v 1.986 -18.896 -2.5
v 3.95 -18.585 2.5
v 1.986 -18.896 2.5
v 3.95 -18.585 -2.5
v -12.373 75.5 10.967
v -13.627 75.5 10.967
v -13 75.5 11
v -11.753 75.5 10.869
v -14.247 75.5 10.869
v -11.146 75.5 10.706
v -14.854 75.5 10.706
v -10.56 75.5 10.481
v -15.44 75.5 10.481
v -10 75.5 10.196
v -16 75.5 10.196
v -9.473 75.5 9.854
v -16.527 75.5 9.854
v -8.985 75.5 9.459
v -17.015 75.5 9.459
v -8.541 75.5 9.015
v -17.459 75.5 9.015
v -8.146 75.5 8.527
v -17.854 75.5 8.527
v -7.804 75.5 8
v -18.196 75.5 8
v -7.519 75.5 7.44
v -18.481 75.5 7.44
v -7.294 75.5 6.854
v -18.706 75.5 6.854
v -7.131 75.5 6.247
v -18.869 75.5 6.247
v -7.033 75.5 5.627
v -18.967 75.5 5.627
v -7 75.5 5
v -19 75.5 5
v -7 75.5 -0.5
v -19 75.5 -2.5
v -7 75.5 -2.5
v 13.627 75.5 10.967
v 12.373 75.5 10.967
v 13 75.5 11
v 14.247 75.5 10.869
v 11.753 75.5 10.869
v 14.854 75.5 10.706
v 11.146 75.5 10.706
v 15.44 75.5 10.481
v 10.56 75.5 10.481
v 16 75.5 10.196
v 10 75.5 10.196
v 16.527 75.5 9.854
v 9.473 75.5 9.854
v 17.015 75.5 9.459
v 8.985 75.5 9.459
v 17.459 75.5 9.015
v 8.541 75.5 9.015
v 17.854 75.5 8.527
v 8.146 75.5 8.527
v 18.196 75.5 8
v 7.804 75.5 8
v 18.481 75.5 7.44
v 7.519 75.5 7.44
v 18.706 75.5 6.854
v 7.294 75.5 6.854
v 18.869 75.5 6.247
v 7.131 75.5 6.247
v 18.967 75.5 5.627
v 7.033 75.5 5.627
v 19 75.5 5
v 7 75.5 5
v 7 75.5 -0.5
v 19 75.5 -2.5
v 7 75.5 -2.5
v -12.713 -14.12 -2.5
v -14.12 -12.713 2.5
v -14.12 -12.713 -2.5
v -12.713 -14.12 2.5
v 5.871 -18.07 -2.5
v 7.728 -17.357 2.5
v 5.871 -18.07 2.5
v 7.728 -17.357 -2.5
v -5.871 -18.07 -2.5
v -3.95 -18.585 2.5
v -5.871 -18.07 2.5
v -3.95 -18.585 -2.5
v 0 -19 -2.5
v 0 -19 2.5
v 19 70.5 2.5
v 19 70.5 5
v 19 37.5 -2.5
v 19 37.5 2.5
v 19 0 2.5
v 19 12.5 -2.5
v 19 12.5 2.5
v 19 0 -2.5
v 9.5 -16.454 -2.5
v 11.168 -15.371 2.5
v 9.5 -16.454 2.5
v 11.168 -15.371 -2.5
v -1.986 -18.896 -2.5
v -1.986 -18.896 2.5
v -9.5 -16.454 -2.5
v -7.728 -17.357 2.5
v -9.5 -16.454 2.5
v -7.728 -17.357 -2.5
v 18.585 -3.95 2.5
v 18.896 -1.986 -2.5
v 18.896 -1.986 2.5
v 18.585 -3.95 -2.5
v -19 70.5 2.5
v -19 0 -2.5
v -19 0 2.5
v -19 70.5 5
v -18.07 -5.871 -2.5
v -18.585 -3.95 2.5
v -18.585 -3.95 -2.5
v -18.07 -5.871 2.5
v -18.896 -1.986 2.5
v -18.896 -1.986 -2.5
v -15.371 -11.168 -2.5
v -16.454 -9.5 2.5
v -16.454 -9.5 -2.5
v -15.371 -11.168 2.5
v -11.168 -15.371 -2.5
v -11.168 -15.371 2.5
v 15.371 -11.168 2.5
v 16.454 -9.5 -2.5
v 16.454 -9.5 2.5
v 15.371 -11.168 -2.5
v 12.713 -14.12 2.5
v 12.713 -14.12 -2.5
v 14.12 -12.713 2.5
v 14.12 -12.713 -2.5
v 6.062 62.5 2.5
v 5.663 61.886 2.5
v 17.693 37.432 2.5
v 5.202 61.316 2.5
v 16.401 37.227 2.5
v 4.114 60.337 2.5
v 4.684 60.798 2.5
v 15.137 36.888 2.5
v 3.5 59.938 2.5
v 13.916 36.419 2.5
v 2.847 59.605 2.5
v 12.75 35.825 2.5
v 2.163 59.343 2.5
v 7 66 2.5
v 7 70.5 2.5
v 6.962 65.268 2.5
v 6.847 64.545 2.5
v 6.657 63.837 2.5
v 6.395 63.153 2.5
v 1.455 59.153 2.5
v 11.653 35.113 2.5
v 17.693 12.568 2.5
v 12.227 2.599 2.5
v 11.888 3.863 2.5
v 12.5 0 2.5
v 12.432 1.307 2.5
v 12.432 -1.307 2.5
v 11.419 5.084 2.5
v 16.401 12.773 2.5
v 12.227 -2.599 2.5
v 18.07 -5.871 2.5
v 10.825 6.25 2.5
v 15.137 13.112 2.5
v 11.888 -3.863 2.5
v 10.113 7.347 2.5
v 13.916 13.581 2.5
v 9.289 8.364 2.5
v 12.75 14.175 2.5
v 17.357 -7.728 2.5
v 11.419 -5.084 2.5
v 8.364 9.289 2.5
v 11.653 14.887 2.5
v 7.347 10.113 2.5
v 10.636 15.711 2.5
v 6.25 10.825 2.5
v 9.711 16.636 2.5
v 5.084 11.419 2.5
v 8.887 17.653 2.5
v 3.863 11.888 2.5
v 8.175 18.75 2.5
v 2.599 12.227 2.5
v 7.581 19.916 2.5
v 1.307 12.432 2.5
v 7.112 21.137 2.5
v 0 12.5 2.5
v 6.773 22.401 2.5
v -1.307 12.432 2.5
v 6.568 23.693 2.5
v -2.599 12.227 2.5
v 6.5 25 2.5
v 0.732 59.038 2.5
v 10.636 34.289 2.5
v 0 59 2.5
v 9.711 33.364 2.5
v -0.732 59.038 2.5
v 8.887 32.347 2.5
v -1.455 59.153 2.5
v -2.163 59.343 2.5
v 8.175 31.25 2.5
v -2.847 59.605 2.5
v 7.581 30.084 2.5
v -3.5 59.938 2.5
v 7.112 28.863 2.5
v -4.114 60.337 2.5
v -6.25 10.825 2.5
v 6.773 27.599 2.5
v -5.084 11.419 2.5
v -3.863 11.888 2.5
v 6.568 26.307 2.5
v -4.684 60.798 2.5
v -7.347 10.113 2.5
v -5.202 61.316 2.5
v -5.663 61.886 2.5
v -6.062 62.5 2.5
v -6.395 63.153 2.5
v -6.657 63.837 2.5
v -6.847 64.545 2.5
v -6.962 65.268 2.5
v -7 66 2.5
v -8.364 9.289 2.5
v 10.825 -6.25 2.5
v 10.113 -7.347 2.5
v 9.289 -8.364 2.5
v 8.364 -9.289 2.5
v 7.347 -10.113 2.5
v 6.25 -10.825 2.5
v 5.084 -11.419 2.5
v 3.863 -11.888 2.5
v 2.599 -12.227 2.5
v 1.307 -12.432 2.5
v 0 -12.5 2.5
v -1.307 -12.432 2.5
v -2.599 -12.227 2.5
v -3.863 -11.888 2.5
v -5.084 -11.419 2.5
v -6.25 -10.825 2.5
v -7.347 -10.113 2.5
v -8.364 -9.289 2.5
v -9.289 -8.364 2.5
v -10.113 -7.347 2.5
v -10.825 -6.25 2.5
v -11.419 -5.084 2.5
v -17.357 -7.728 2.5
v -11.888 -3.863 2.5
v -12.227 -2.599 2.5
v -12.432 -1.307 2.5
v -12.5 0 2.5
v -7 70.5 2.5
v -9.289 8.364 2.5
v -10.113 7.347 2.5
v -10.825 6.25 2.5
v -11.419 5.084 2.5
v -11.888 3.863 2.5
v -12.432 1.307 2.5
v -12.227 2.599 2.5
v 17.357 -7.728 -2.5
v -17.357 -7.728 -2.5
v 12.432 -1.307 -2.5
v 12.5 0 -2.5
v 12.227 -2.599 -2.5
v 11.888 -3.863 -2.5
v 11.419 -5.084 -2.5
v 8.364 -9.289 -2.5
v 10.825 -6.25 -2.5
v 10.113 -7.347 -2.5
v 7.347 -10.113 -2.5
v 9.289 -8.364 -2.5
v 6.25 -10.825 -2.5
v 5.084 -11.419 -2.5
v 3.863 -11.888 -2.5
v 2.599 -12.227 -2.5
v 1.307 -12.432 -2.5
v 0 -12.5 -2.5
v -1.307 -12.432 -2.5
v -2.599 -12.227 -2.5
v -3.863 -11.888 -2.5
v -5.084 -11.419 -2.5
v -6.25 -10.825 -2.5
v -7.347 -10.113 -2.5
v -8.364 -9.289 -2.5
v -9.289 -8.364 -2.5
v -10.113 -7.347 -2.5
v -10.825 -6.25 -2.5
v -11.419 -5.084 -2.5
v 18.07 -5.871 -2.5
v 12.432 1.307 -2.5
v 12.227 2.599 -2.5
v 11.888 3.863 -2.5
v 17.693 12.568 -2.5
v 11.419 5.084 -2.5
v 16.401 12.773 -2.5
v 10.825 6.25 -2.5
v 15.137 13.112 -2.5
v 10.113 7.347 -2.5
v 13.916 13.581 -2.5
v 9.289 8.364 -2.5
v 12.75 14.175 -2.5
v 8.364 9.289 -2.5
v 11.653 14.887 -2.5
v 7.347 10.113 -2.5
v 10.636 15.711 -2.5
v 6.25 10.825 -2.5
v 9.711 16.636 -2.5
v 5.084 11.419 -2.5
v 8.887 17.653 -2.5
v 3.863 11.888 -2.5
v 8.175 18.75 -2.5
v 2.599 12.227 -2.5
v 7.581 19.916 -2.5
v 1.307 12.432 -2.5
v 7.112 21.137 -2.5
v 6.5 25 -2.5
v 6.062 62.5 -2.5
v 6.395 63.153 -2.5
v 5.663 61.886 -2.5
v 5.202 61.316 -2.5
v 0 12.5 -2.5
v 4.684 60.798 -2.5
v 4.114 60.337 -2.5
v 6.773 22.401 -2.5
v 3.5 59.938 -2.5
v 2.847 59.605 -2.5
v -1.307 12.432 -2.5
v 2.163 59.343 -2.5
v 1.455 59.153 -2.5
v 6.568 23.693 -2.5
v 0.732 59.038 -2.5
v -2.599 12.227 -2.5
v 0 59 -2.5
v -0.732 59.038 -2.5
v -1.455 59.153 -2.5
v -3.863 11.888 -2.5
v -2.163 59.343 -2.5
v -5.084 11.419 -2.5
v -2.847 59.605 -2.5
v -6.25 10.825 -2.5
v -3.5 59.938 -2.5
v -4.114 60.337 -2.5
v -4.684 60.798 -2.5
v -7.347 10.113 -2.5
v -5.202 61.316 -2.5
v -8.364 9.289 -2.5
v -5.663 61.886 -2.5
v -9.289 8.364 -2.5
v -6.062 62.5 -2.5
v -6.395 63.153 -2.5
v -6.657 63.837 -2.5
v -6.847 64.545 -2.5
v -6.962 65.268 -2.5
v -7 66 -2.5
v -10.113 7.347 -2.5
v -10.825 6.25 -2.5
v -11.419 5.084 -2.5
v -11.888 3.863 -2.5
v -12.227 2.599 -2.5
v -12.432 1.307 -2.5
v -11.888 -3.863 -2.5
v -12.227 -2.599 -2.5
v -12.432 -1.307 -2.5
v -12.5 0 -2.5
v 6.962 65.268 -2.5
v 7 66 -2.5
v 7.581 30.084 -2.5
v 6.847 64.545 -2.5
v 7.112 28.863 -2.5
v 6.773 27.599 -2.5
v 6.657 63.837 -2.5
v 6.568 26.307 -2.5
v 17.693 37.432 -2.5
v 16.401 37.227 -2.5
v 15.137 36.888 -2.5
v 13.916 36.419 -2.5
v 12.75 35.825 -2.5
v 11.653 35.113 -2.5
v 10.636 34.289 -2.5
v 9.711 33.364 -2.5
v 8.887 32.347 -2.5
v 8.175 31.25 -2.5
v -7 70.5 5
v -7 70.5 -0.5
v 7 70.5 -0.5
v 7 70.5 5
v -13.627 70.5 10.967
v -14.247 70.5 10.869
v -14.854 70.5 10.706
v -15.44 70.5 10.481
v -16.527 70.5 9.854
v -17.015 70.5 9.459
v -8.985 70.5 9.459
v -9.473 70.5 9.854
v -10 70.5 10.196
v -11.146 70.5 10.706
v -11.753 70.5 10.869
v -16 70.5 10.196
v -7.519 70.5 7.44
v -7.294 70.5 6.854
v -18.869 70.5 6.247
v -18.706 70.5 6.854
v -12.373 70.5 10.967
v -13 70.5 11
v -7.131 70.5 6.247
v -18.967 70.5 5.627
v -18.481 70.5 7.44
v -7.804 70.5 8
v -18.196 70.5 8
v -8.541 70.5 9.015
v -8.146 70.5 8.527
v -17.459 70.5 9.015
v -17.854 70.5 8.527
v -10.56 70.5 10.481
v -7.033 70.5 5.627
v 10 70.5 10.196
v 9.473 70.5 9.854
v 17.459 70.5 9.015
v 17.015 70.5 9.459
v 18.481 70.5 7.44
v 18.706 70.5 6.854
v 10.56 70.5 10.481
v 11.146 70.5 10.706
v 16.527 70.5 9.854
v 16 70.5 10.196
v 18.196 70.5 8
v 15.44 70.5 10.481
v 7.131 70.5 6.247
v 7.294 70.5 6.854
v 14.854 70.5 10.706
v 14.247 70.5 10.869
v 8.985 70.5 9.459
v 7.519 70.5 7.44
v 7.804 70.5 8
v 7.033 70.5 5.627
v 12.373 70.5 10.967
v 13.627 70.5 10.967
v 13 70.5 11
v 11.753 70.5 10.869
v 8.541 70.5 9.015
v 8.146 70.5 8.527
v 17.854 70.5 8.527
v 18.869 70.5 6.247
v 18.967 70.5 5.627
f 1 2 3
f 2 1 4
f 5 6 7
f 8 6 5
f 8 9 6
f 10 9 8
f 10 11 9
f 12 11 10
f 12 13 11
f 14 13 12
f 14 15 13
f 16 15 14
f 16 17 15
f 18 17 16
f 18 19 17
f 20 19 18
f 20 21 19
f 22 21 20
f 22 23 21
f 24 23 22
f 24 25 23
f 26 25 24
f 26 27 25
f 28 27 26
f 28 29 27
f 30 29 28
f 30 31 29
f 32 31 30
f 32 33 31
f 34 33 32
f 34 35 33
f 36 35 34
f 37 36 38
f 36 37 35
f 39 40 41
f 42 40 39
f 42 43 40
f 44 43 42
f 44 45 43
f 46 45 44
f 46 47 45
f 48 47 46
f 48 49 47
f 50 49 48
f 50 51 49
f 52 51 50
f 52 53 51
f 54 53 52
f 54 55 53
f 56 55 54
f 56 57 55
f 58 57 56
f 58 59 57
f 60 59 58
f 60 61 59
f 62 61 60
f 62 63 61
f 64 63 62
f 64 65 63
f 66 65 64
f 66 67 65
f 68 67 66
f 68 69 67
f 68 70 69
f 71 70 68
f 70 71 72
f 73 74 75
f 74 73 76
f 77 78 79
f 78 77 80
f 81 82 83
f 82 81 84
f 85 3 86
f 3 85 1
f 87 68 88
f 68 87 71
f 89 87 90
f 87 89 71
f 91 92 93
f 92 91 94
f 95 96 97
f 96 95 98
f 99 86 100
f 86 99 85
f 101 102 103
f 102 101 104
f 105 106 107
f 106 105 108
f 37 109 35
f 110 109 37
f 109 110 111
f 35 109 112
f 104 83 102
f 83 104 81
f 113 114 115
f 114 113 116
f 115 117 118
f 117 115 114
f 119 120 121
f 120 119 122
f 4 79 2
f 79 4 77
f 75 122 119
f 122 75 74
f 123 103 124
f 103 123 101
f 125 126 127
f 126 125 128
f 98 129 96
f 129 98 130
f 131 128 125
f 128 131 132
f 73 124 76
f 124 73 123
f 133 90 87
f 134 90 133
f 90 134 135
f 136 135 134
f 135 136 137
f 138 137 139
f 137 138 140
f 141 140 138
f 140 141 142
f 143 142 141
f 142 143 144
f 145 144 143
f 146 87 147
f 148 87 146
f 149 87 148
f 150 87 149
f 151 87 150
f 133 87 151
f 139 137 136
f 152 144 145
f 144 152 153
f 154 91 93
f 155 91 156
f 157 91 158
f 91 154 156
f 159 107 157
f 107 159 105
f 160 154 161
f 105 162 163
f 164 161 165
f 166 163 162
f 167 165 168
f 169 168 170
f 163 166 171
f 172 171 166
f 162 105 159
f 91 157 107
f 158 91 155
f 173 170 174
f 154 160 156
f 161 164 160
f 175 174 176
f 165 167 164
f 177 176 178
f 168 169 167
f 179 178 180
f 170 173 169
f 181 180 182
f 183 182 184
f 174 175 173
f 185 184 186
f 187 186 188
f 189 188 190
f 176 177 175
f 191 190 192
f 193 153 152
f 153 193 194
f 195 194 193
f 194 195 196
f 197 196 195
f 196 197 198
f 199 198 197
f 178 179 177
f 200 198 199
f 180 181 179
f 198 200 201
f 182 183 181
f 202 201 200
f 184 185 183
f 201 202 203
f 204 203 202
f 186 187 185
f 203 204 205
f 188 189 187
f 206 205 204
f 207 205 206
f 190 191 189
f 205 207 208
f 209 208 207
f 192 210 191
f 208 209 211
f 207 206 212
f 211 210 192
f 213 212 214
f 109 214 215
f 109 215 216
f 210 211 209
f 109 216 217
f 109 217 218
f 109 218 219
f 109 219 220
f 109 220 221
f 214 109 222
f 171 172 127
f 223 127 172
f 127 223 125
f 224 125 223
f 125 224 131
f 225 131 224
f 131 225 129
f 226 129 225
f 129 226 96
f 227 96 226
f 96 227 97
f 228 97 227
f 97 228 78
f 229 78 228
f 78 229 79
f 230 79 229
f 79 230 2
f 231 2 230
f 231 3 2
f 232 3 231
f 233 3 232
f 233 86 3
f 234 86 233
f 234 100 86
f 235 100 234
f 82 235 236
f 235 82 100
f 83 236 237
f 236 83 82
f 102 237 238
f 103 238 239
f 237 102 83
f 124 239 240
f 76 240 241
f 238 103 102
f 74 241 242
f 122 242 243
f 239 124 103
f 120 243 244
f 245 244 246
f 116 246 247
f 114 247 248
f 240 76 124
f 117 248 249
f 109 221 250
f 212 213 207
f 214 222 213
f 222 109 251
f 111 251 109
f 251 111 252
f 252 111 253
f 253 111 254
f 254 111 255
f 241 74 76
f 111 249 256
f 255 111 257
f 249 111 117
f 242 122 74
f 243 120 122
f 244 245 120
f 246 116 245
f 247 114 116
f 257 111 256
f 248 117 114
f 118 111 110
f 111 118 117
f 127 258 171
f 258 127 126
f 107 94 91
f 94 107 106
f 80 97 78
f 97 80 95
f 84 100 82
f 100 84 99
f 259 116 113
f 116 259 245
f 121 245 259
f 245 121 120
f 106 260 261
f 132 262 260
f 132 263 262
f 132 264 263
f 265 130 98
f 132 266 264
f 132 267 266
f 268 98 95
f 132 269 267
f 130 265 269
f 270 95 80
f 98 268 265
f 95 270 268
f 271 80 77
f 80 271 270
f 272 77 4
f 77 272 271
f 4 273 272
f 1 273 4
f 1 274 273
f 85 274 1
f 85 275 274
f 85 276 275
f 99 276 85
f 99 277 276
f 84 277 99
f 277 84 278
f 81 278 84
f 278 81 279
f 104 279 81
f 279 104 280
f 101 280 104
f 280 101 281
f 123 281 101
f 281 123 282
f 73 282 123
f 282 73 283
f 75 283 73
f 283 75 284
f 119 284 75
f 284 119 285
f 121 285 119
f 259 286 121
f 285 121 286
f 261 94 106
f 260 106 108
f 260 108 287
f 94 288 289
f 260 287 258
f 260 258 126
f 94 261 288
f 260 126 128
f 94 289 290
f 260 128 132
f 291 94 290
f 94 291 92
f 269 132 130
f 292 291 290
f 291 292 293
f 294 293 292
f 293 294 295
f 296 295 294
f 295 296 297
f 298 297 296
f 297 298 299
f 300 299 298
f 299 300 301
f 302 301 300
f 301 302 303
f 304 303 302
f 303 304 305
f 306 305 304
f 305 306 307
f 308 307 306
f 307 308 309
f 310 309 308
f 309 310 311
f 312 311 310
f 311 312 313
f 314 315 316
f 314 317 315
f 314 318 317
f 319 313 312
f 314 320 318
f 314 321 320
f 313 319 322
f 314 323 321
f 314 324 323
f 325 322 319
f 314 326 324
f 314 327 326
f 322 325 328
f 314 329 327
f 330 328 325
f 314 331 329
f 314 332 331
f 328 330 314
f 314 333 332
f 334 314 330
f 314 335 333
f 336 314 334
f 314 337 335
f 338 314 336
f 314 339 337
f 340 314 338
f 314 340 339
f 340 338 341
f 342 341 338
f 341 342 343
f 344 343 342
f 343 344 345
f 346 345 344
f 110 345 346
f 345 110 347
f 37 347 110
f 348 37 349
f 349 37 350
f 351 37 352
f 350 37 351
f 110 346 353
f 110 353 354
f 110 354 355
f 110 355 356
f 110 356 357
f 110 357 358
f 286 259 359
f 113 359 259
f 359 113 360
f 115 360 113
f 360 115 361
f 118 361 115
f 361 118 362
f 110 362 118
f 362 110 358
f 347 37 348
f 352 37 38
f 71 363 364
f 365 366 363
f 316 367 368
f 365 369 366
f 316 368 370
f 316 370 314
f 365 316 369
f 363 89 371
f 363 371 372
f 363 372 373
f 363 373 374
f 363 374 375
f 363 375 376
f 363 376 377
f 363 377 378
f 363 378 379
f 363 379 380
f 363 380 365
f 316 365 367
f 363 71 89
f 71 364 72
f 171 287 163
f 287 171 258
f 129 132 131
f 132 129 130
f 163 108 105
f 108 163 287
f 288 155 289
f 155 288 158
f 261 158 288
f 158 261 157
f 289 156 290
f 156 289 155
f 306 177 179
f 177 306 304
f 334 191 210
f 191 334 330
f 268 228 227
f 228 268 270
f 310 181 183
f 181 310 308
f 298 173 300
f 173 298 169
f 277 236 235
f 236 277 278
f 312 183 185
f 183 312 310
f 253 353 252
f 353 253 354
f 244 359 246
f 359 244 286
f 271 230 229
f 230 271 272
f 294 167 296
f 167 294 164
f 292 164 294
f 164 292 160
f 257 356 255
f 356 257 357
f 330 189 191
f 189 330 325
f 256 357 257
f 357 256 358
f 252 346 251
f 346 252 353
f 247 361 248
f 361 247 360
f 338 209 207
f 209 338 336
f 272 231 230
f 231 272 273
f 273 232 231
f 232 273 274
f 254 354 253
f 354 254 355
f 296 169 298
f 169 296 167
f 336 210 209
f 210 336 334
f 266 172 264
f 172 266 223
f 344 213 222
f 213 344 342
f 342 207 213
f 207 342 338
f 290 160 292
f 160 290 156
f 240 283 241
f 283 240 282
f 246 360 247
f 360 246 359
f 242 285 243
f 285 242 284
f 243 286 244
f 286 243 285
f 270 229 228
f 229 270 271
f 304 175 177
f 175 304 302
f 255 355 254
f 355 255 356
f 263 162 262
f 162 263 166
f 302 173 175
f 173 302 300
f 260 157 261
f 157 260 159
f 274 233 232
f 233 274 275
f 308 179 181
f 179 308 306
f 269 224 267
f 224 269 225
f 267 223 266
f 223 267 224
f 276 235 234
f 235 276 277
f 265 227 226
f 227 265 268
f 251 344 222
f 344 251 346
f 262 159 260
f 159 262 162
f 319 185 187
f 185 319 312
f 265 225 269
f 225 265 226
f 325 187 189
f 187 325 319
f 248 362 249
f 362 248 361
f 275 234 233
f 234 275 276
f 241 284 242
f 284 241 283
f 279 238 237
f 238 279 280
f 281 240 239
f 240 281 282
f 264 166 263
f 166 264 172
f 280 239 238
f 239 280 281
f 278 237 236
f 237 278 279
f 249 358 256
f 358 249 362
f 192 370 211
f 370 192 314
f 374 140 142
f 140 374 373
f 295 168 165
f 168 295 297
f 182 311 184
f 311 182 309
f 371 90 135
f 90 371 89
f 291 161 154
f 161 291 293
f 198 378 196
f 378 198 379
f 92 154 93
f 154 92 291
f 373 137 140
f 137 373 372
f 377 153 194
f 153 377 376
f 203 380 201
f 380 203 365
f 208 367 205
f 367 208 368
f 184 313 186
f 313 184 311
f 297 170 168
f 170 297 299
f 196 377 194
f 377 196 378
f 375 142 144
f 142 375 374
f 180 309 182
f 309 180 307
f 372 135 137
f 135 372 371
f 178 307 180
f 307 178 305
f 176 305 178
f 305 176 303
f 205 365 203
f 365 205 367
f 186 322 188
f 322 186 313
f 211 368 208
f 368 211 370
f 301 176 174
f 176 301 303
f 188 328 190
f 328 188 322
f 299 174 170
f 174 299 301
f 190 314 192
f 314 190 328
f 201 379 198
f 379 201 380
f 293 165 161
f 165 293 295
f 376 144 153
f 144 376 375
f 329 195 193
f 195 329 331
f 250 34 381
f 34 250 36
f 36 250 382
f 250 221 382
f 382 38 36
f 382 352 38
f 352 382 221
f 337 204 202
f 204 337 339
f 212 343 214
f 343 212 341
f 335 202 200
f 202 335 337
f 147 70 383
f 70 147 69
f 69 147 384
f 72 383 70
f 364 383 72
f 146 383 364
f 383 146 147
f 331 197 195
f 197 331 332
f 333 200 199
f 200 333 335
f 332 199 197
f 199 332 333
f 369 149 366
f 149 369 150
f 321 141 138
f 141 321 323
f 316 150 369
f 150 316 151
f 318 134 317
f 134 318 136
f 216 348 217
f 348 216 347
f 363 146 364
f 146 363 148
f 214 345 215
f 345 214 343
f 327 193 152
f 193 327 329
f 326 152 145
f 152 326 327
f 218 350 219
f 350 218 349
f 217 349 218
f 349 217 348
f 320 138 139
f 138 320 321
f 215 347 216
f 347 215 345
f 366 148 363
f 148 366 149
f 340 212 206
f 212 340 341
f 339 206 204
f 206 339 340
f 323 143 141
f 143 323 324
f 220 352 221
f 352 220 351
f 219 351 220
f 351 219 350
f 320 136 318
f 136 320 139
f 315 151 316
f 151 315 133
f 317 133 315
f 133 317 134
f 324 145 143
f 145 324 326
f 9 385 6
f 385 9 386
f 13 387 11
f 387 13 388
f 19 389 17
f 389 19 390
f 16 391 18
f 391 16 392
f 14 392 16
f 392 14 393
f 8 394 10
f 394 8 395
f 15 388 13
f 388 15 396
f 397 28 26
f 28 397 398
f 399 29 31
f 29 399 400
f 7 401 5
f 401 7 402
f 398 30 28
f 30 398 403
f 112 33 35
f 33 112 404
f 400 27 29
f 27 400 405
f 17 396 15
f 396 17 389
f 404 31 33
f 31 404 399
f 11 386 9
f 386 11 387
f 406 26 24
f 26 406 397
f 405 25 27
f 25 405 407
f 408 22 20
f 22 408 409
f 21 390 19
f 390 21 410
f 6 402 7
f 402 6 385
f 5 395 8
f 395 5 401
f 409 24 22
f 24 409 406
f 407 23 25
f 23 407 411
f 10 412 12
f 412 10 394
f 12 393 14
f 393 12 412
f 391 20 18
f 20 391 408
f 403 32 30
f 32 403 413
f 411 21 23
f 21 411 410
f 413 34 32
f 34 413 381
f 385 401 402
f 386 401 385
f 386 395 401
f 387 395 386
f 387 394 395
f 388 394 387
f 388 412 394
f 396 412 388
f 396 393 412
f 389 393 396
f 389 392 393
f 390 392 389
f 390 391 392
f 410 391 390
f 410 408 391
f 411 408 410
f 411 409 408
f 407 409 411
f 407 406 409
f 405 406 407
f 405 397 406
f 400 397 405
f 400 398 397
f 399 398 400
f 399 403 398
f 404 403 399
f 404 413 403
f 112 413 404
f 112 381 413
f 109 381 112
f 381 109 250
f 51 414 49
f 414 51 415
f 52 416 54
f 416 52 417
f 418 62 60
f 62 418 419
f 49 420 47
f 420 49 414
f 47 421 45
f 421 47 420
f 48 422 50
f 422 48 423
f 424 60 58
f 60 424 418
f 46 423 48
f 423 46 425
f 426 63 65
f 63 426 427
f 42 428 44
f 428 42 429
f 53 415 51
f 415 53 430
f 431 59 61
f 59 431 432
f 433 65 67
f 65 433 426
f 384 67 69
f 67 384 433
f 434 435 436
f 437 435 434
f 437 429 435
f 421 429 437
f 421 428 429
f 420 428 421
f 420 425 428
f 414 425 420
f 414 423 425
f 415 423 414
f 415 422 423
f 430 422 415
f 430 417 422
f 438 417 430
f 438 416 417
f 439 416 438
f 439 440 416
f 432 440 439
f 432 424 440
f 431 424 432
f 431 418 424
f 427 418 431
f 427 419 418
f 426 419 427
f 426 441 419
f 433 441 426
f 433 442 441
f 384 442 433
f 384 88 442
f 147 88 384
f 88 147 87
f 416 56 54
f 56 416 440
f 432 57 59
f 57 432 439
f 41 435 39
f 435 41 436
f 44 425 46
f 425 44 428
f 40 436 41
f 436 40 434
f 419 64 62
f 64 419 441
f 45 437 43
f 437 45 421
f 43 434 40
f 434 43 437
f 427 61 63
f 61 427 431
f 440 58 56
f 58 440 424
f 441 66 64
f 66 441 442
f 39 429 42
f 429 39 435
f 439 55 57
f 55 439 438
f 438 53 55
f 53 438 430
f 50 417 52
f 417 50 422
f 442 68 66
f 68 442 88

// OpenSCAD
$fn=60;
inner_hole=25;
outer_dia=38;
height=5;

mount(offset=75);

module mount(offset=50){
  difference(){
    hull(){
      cylinder(d=outer_dia, h=height,center=true);
      translate([0,offset,0]) cube([outer_dia,1,height], center=true);
    }
    cylinder(d=inner_hole, h=height+1,center=true);
    translate([outer_dia/2,inner_hole,0])
      cylinder(d=inner_hole, h=height+1,center=true);
    translate([0,offset-9,0]) hull(){
      cylinder(d=14, h=height+1,center=true);
      translate([0,10,0]) cube([14,1,height+1], center=true);
    }
  }
  for(X=[-1,1]) translate([13*X,offset+.5,0]) 
  hull(){
    translate([0,0,5]) rotate([90,0,0])
      cylinder(d=(outer_dia-14)/2, h=height);
    translate([0,-2.5,0]) cube([(outer_dia-14)/2,5,1],center=true);
  }
}
